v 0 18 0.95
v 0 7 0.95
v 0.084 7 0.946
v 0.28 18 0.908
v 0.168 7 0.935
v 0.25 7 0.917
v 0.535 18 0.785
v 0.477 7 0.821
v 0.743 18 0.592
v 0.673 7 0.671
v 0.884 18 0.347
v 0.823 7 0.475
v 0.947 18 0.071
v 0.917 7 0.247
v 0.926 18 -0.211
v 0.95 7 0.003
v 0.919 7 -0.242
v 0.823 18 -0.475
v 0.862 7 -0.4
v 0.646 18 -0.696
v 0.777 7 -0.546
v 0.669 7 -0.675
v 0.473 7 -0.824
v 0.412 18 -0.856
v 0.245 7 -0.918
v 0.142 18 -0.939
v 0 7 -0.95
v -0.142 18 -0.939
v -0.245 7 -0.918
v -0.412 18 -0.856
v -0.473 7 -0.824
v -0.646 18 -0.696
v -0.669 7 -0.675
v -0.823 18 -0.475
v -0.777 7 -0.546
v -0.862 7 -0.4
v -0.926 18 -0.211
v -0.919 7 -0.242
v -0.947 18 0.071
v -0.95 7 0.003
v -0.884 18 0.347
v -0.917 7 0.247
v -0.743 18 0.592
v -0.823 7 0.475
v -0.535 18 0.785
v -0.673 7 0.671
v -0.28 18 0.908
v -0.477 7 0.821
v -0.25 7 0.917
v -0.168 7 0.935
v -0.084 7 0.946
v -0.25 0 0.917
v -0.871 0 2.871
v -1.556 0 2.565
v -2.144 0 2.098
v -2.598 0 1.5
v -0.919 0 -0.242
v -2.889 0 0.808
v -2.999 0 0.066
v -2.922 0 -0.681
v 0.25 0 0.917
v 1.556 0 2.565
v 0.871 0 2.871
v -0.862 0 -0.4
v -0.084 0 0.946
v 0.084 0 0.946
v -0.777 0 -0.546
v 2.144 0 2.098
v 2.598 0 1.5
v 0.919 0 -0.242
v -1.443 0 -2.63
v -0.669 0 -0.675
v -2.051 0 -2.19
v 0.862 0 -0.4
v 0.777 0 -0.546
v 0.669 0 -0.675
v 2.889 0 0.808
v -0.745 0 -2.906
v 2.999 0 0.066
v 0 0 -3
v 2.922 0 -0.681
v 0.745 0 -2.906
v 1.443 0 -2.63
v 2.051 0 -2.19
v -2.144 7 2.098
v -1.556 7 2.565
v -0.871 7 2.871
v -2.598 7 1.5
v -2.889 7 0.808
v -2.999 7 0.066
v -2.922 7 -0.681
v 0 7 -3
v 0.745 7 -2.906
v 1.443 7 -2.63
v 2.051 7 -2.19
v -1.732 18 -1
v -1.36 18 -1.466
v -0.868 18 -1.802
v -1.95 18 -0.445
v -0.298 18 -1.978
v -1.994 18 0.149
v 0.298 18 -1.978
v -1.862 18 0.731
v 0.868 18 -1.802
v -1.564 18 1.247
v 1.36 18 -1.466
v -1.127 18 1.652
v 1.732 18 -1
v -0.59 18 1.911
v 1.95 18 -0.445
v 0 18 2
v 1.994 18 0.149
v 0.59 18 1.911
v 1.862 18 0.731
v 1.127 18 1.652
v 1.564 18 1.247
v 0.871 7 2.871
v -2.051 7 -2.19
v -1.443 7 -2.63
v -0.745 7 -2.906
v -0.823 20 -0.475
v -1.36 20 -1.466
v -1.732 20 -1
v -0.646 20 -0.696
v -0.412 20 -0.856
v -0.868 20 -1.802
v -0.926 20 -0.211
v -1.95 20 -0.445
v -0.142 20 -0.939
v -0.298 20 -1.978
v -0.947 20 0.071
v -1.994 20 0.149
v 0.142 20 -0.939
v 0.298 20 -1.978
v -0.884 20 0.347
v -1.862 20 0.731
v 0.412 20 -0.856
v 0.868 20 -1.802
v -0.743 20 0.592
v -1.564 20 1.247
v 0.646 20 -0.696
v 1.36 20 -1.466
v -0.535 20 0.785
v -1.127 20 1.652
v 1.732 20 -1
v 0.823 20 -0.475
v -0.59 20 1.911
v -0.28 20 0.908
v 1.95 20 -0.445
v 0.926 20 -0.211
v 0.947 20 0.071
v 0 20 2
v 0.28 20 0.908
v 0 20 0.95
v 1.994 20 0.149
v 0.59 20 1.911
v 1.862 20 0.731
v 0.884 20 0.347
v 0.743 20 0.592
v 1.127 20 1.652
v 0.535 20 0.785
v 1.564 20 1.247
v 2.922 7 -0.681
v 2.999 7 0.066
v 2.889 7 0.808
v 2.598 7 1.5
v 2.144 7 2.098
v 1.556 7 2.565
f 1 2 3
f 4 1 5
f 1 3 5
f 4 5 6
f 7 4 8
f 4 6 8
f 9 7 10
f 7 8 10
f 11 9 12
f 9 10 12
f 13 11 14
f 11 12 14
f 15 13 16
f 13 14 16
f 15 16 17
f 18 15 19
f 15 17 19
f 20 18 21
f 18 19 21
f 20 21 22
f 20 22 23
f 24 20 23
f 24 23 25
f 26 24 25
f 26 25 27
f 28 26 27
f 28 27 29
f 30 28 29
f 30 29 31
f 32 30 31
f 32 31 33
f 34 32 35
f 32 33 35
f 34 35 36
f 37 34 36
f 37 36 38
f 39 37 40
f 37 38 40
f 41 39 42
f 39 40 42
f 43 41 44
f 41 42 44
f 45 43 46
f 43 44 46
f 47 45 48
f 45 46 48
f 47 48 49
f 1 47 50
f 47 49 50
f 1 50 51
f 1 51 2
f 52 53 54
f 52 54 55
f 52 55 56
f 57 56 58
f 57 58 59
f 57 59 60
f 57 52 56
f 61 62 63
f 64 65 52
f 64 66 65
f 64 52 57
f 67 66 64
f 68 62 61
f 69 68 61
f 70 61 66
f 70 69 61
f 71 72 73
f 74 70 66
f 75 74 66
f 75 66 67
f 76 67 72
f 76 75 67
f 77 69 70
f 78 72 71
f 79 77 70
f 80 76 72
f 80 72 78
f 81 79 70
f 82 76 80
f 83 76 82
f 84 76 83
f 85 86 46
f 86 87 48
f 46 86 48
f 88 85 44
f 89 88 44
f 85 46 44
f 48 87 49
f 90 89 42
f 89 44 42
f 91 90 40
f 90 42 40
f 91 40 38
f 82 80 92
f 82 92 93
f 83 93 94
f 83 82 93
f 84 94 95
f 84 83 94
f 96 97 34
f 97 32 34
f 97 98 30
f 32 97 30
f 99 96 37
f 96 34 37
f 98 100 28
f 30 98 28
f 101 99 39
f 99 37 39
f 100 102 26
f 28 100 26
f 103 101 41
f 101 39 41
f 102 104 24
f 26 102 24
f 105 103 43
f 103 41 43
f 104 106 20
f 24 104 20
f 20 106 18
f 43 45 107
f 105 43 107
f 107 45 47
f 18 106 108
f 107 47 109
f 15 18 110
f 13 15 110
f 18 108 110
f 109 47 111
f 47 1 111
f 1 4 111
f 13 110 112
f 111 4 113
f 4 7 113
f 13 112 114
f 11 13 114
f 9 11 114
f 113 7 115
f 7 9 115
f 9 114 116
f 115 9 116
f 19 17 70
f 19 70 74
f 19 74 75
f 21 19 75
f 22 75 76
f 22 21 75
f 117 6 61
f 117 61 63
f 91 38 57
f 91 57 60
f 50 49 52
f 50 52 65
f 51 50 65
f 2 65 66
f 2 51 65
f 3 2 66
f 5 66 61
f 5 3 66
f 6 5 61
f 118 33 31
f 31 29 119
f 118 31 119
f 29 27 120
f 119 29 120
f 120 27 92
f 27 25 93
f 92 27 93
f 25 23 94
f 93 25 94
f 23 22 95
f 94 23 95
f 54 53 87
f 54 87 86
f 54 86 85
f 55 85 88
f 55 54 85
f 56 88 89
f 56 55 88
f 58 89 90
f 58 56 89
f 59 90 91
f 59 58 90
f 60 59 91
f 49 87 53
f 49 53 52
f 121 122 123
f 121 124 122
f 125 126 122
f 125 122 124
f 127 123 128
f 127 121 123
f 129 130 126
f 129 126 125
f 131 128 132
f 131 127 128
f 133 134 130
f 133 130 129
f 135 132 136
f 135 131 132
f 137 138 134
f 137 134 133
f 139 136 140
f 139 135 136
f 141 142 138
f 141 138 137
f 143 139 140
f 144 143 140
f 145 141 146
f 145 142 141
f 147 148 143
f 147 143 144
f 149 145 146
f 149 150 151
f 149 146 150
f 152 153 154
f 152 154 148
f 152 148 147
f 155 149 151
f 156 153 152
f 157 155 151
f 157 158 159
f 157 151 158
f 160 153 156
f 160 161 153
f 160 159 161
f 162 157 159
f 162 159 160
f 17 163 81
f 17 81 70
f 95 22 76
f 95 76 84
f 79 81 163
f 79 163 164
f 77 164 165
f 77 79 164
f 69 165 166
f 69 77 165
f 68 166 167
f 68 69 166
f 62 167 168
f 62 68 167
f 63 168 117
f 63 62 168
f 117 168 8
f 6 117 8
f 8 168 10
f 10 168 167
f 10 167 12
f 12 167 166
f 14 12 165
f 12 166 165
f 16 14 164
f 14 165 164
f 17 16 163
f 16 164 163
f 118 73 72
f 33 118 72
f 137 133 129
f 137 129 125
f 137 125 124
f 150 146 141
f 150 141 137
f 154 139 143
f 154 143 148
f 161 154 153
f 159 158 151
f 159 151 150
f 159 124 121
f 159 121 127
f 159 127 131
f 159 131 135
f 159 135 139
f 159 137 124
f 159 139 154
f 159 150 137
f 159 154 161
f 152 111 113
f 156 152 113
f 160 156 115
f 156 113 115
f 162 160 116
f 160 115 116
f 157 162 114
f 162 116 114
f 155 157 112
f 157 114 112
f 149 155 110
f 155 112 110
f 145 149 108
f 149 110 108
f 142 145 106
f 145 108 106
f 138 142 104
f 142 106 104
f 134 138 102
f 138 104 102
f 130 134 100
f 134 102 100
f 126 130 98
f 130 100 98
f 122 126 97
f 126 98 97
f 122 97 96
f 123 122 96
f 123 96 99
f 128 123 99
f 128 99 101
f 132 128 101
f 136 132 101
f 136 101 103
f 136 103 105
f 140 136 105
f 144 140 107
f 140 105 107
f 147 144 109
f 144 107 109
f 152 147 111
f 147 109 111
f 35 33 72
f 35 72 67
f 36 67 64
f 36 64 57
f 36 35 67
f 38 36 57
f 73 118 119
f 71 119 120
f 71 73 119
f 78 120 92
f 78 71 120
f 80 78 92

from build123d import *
from build123d.topology import SkipClean

# Parameters (mm, degrees)
SKETCH1_R           = 0.95
BOSS_EXTRUDE1_DEPTH = 20
SKETCH2_R           = 3
SKETCH2_R_2         = 0.95
BOSS_EXTRUDE2_DEPTH = 7
CUT_EXTRUDE1_DEPTH  = 14.674794331
CIRPATTERN1_COUNT   = 3
SKETCH5_R           = 2
BOSS_EXTRUDE3_DEPTH = 2


with BuildPart() as part:
    # Sketch1 → Boss-Extrude1 (new body)
    with BuildSketch(Plane(origin=(0, 0, 0), x_dir=(1, 0, 0), z_dir=(0, 1, 0))):
        with Locations(Location((0, 0, 0), (0, 0, 270))):
            Circle(SKETCH1_R)
    extrude(amount=BOSS_EXTRUDE1_DEPTH)

    # Sketch2 → Boss-Extrude2 (add)
    with BuildSketch(Plane.XZ):
        with Locations(Location((0, 0, 0), (0, 0, 270))):
            Circle(SKETCH2_R)
        with Locations(Location((0, 0, 0), (0, 0, 270))):
            Circle(SKETCH2_R_2, mode=Mode.SUBTRACT)
    extrude(amount=-BOSS_EXTRUDE2_DEPTH)

    # Sketch3 → Cut-Extrude1 (cut, through all)
    with SkipClean():  # the faces are left unmerged after this step: merging them gives an invalid solid
        with BuildSketch(Plane(origin=(0, 7, 0), x_dir=(1, 0, 0), z_dir=(0, 1, 0))):
            with BuildLine():
                Line((0.25, -0.916515139), (1.158545021, -3.775631426))
                Line((1.158545021, -3.775631426), (-1.158545021, -3.775631426))
                Line((-1.158545021, -3.775631426), (-0.25, -0.916515139))
                ThreePointArc((-0.25, -0.916515139), (0, -0.95), (0.25, -0.916515139))
            make_face()
        cut_extrude1 = extrude(amount=-CUT_EXTRUDE1_DEPTH, mode=Mode.SUBTRACT)

    # CirPattern1: Cut-Extrude1 ×3 about axis
    with SkipClean():  # the faces are left unmerged after this step: merging them gives an invalid solid
        cirpattern1_axis = Axis((0, 0, 0), (0, 1, 0))
        for i in range(1, CIRPATTERN1_COUNT):
            add(cut_extrude1.rotate(cirpattern1_axis, i * 360 / CIRPATTERN1_COUNT), mode=Mode.SUBTRACT)

    # Sketch5 → Boss-Extrude3 (add)
    with SkipClean():  # the faces are left unmerged after this step: merging them gives an invalid solid
        with BuildSketch(Plane(origin=(0, 18, 0), x_dir=(1, 0, 0), z_dir=(0, 1, 0))):
            with Locations(Location((0, 0, 0), (0, 0, 270))):
                Circle(SKETCH5_R)
        extrude(amount=BOSS_EXTRUDE3_DEPTH)


solid = part.part
